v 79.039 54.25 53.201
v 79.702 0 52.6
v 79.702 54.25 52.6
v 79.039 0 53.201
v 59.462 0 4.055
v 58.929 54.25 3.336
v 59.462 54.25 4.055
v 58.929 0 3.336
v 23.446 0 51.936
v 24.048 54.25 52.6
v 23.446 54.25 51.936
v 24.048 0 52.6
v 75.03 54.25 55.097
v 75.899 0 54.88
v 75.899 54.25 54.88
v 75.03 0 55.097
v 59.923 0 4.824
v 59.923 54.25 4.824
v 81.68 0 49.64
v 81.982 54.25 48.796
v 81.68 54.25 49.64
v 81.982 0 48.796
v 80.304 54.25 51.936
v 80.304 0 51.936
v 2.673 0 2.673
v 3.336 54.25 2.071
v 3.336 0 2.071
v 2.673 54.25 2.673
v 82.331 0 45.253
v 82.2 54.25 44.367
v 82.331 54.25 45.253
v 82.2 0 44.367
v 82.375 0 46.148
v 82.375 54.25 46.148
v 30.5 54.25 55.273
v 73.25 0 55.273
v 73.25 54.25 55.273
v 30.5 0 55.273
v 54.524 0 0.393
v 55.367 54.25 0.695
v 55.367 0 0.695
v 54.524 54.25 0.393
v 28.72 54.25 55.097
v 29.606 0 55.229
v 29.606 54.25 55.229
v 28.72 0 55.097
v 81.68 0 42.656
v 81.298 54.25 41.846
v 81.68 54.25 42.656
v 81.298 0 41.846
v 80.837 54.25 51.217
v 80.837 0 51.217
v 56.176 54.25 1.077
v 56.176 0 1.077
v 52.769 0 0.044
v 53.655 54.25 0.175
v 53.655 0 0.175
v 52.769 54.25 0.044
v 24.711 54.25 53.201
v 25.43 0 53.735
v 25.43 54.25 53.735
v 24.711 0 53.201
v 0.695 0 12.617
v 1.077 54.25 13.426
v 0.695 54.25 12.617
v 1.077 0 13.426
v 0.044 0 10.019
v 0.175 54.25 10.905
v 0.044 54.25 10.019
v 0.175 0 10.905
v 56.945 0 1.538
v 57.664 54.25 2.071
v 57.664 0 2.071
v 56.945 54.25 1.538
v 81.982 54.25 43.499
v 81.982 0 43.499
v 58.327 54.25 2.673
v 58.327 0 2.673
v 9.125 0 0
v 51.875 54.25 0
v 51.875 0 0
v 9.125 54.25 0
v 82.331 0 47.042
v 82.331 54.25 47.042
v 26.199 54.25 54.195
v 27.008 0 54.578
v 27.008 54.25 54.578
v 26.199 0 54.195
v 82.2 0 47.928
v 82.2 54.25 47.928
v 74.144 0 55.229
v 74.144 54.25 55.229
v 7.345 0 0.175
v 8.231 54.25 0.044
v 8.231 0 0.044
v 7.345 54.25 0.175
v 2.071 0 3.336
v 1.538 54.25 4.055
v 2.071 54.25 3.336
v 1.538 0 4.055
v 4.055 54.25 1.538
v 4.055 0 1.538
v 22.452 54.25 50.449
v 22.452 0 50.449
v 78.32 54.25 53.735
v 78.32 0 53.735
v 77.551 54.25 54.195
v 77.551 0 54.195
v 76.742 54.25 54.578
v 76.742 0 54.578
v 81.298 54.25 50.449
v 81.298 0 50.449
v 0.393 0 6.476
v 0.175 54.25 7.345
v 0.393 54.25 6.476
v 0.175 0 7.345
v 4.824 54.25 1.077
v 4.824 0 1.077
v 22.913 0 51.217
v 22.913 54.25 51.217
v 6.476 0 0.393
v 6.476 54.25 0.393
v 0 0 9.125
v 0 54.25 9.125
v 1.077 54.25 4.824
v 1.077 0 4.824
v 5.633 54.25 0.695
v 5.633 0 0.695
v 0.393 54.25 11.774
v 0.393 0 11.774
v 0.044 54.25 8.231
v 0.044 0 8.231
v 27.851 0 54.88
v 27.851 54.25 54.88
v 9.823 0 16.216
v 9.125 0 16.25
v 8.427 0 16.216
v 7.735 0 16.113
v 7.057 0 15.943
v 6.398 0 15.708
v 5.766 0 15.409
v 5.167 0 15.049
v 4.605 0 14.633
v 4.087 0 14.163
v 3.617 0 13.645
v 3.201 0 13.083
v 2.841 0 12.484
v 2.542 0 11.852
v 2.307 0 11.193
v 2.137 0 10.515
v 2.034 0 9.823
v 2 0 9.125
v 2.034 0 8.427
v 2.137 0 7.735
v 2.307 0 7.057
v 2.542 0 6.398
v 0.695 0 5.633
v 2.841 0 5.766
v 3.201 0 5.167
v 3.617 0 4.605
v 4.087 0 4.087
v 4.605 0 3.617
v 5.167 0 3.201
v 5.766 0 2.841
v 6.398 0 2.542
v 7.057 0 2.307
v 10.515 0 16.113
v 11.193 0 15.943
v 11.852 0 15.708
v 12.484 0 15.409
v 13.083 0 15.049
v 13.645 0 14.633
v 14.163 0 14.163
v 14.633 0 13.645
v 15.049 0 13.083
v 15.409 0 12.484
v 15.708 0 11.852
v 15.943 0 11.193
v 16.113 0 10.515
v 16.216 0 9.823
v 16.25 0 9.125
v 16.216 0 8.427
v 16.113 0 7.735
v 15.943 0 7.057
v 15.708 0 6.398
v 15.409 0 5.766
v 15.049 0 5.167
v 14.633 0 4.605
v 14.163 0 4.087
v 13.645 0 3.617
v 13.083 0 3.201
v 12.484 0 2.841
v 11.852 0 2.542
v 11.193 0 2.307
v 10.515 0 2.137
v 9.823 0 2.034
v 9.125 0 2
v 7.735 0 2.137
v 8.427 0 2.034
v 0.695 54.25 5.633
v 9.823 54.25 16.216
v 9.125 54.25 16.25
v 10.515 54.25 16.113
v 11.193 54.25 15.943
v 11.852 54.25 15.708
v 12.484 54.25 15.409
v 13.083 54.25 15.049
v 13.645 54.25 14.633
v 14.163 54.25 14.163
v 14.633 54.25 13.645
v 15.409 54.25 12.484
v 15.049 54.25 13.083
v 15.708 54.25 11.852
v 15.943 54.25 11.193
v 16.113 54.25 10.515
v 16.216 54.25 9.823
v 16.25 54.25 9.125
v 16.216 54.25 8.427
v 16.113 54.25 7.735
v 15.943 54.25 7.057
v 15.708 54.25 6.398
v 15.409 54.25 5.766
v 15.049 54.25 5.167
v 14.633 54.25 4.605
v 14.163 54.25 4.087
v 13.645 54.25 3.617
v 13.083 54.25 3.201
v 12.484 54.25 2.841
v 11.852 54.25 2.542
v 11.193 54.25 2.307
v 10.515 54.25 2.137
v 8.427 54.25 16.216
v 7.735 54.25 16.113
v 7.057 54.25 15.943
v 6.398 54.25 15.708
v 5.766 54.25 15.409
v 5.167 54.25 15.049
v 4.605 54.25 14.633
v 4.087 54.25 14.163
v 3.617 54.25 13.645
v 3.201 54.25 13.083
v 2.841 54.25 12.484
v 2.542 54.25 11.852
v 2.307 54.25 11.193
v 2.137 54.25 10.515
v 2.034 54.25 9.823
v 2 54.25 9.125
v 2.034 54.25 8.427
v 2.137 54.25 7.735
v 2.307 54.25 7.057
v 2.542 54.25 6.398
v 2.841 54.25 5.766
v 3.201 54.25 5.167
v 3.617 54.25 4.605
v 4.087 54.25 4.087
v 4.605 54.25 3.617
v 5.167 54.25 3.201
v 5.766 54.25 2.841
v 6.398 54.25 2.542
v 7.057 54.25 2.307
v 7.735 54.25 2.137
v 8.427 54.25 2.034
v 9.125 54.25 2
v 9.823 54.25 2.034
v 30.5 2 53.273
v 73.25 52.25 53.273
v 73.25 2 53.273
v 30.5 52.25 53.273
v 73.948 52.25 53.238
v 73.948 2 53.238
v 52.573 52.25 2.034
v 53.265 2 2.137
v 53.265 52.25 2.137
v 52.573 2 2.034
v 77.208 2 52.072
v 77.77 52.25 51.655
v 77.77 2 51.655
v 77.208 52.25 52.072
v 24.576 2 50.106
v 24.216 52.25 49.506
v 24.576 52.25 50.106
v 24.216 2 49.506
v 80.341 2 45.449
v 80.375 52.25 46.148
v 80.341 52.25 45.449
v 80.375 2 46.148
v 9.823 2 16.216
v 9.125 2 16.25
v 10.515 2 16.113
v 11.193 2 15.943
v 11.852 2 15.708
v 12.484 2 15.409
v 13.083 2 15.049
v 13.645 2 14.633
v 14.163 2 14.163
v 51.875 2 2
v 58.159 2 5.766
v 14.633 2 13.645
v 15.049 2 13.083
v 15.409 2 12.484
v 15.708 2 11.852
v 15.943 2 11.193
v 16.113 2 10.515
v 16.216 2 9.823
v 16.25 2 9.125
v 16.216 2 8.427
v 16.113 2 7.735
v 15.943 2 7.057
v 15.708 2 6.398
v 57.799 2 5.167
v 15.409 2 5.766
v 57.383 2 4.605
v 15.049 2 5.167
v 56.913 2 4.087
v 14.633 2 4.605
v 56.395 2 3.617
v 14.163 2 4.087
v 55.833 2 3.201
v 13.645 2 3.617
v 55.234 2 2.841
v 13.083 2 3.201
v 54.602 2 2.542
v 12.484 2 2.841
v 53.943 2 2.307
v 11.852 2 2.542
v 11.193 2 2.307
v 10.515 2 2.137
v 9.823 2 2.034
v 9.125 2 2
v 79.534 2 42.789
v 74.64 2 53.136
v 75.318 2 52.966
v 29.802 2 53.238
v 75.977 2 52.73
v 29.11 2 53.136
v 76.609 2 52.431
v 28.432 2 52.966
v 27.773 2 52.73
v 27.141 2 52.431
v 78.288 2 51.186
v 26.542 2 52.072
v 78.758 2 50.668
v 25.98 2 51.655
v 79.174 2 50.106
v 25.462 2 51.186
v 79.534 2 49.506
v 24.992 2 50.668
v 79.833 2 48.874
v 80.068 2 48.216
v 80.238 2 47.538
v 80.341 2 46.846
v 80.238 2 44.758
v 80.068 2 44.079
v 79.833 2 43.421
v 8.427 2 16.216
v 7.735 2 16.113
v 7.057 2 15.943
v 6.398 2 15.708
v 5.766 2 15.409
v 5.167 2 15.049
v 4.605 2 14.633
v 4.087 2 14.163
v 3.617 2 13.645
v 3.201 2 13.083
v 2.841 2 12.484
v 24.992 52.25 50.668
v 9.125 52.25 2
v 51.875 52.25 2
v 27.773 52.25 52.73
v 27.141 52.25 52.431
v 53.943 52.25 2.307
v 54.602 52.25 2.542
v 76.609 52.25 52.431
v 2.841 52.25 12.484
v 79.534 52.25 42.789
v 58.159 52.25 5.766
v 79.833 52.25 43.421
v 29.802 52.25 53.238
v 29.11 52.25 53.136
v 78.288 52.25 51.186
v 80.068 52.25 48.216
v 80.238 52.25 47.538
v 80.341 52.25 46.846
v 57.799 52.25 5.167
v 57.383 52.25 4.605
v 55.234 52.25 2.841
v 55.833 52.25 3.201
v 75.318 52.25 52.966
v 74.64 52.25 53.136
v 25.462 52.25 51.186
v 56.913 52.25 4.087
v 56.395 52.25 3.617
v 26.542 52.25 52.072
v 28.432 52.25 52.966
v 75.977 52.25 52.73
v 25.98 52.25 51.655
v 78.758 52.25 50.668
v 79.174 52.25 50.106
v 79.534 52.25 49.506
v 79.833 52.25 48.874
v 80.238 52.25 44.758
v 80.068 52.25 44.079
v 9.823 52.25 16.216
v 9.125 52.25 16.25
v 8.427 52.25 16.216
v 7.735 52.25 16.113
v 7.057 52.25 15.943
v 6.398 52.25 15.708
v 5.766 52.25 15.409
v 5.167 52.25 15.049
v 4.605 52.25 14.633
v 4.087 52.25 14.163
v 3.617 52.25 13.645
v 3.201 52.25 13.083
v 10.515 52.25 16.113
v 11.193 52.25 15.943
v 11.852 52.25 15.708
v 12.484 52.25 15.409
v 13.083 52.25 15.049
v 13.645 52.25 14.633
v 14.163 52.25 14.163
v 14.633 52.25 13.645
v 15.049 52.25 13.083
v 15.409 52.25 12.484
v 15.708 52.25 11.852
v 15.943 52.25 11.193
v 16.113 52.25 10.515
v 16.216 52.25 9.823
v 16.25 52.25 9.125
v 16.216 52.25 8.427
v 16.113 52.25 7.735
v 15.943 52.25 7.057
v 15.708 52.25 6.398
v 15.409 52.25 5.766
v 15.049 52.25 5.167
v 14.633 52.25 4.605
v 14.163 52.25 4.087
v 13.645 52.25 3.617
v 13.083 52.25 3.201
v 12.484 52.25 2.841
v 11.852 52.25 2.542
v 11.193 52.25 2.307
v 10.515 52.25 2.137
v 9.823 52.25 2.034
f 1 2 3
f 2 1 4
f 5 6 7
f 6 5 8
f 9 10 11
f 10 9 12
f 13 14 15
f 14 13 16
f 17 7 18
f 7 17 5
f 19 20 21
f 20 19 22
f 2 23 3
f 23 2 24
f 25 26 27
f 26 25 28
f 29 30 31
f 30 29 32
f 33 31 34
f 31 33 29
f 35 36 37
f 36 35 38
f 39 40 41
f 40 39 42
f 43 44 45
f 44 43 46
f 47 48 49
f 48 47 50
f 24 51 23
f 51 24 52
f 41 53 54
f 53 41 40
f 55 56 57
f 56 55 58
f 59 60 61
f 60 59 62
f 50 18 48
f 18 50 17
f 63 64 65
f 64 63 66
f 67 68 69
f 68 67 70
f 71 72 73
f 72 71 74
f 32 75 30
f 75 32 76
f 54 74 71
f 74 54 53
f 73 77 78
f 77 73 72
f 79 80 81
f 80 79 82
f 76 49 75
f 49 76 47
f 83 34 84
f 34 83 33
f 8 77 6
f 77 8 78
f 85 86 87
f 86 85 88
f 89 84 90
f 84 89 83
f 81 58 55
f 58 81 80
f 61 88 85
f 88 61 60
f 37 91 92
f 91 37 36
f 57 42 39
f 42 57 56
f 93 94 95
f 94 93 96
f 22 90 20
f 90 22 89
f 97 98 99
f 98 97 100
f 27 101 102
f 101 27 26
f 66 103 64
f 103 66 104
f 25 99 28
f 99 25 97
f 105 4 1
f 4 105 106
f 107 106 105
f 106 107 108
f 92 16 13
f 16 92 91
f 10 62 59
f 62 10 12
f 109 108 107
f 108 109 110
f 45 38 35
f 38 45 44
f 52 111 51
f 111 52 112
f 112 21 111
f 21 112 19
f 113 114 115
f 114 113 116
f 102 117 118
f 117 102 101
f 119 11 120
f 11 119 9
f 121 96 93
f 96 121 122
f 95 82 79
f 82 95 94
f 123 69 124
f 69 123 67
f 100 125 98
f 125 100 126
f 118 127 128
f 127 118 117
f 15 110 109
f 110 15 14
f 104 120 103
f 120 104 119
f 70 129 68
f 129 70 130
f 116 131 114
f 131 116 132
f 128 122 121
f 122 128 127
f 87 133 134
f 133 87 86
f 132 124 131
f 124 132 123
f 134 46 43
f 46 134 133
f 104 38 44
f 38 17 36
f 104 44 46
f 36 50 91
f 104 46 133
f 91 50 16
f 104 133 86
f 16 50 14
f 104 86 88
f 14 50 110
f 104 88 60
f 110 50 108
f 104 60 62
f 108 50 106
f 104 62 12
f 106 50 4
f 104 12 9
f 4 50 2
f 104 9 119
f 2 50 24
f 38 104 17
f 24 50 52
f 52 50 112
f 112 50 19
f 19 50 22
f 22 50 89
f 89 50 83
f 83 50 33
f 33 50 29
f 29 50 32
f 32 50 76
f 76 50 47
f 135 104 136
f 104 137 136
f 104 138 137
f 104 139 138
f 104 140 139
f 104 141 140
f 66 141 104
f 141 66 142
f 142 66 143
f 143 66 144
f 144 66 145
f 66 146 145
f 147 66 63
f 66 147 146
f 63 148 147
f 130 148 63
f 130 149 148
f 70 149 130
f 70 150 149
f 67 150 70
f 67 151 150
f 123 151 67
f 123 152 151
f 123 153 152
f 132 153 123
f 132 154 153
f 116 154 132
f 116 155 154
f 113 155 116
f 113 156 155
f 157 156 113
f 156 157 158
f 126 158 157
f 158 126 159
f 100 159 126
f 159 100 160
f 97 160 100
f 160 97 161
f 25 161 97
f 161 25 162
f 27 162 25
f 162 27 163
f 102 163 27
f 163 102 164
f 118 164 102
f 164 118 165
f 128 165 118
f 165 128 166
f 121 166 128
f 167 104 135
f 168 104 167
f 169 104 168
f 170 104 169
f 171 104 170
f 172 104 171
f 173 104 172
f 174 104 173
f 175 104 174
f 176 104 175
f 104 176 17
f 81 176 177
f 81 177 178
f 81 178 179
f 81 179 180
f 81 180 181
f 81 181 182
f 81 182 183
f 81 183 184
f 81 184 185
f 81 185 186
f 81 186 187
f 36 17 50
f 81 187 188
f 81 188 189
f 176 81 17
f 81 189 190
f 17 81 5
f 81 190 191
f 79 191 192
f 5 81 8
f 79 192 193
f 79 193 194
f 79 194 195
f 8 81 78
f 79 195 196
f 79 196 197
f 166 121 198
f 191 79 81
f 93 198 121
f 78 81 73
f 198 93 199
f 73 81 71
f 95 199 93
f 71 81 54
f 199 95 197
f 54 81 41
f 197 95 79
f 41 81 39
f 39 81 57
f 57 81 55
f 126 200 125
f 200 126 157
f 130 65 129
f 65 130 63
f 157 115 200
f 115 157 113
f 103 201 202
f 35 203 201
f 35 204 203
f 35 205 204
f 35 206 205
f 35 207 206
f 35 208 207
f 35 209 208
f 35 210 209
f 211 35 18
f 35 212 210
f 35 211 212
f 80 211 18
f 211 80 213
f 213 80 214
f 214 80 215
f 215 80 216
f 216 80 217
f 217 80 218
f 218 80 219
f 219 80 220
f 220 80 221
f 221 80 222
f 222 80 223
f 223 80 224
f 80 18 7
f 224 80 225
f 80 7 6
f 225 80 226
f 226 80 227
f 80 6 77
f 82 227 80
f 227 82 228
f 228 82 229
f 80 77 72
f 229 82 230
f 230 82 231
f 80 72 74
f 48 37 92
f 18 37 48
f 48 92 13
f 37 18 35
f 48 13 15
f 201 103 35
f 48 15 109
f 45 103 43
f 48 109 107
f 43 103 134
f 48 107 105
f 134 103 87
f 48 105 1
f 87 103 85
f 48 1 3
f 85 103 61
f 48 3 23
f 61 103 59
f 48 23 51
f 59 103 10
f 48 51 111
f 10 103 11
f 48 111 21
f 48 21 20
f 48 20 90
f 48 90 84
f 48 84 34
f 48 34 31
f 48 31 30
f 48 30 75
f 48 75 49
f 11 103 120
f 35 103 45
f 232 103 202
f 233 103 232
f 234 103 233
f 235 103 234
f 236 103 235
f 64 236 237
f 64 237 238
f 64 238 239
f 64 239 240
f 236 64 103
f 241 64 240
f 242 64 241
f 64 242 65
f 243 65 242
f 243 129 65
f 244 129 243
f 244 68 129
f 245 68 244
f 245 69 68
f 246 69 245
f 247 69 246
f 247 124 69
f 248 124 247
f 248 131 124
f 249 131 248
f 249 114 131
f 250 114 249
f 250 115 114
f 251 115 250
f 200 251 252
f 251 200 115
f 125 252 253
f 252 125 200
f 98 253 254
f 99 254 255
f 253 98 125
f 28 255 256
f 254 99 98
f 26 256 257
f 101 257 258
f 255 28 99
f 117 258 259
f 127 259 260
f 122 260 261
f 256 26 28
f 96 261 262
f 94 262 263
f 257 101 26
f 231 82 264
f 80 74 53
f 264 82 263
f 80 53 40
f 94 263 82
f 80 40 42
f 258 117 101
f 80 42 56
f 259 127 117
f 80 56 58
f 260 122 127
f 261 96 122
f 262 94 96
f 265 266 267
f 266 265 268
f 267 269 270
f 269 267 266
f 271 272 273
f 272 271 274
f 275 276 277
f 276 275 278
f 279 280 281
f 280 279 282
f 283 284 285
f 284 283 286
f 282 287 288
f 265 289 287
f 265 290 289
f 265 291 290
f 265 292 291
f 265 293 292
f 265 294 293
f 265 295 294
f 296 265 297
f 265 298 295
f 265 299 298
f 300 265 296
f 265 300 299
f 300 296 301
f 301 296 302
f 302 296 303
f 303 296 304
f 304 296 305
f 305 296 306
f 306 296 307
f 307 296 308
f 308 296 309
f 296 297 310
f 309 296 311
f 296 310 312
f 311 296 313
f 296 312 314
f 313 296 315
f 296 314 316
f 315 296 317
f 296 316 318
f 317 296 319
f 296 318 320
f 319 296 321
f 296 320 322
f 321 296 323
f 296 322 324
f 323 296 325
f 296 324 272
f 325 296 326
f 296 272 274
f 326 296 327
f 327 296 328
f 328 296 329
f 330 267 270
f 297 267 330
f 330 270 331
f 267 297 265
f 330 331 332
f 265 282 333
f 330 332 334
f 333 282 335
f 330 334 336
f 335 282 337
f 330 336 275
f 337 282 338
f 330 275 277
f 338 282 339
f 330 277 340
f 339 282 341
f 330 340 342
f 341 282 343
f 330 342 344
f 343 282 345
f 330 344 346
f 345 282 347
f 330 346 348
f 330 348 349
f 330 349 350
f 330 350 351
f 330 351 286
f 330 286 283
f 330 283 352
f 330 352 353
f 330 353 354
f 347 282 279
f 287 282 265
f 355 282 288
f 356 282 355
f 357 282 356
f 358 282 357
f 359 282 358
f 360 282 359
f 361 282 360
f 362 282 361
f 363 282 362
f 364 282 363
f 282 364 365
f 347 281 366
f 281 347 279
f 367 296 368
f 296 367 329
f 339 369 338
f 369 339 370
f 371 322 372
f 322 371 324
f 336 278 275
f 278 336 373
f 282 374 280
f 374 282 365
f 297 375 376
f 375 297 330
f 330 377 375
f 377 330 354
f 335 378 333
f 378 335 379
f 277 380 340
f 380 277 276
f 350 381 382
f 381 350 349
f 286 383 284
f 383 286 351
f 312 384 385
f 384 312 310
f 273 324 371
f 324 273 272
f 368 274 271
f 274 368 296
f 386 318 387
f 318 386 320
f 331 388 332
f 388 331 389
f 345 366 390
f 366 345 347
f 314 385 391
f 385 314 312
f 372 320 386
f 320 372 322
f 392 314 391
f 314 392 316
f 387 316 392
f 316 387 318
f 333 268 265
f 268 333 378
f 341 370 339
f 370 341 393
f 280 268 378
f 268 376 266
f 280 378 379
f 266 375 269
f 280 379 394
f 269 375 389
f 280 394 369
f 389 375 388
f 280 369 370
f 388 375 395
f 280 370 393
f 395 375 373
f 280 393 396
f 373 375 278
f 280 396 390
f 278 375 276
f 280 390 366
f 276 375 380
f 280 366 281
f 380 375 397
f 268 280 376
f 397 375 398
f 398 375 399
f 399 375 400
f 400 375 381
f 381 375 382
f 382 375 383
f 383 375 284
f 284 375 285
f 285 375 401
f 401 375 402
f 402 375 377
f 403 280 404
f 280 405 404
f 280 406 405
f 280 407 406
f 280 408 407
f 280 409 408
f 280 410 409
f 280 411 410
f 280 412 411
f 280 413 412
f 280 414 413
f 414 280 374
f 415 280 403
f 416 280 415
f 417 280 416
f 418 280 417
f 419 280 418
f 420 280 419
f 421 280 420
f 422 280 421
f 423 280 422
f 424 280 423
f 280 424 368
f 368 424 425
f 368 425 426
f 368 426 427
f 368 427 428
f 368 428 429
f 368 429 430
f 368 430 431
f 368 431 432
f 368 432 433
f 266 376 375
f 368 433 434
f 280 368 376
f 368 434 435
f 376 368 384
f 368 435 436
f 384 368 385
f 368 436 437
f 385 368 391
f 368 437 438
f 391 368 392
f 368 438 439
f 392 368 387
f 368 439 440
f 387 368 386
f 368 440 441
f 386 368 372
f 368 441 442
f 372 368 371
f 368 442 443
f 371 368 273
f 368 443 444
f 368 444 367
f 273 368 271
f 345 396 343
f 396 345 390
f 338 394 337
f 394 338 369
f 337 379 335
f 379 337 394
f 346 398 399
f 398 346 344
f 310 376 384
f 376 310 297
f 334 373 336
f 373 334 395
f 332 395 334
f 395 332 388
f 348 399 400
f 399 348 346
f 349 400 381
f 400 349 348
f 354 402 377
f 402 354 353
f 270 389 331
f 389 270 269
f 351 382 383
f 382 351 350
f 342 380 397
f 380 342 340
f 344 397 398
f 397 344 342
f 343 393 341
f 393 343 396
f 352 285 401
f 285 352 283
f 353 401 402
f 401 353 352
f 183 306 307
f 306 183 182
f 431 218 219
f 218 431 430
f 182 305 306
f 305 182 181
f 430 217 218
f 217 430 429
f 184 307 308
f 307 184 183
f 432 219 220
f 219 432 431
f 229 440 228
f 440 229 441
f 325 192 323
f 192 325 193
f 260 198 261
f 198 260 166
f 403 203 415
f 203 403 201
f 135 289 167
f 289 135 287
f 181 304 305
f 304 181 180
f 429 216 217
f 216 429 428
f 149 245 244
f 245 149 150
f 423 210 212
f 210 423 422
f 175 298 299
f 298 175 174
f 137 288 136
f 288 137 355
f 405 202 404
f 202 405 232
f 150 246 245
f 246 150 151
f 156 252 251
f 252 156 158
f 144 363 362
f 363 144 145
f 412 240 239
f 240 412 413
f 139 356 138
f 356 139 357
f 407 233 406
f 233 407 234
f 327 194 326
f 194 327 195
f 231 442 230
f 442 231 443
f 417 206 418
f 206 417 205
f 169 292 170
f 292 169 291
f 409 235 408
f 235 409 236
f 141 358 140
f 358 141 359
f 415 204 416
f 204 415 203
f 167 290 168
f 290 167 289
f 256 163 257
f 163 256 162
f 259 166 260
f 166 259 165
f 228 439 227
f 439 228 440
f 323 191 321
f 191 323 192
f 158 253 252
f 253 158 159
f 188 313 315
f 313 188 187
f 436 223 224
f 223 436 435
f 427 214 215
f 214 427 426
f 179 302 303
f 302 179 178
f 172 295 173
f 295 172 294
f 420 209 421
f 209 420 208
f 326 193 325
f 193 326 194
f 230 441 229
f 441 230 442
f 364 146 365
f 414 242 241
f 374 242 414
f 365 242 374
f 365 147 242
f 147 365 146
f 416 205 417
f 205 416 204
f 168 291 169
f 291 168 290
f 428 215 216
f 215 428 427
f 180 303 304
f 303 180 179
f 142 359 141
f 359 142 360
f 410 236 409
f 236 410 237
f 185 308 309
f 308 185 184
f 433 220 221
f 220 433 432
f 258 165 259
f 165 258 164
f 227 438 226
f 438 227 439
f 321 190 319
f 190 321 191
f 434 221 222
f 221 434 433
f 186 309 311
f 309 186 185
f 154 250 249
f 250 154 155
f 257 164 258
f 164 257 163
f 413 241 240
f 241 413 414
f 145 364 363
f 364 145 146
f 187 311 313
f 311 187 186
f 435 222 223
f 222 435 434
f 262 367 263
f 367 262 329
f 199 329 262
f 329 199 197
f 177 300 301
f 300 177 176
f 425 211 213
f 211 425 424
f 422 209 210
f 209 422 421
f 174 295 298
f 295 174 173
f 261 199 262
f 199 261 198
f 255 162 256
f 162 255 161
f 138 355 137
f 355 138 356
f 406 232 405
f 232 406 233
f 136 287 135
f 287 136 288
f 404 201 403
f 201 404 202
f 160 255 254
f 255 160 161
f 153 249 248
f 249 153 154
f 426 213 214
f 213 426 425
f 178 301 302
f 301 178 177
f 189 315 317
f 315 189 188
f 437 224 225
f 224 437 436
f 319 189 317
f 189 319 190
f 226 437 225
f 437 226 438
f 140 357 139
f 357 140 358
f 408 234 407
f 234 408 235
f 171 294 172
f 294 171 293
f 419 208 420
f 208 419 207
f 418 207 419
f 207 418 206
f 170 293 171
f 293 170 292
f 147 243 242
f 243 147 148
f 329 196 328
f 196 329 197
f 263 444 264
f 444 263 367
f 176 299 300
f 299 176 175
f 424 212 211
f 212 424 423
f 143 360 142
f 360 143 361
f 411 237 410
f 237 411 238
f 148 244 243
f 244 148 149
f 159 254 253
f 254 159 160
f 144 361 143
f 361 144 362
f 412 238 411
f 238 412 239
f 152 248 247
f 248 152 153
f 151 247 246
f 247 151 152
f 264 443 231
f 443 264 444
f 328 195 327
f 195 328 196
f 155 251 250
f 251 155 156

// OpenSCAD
aa_d = 14.25;
aa_h = 50.25;
aaa_d = 10.25;
aaa_h = 44;


module battery(d, h) {
  rotate([-90, 0, 0]) cylinder(h=h, d=d, $fn=64);
}


module batteries(d, h, rows, cols, padding) {
  _h = h / 2 + padding;
  translate([d / 2 + padding, _h, d / 2 + padding])
    minkowski() {
      battery(d + 2 * padding, _h);
      rotate([90, 0, 0])
        linear_extrude(_h)
          polygon([
            [                 0               ,                        0],
            [         (rows - 1) * d * sin(30), (cols - 1) * d * cos(30)],
            [(rows - 1) * (d + d * sin(30))   , (cols - 1) * d * cos(30)],
            [(rows - 1) * d                   ,                        0]
          ]);
    }
}


difference() {
  batteries(aa_d, aa_h, 4, 4, 2);
  translate([2, 2, 2])
    batteries(aa_d, aa_h, 4, 4, 0);
  translate([aa_d / 2 + 2, 0, aa_d / 2 + 2])
    battery(aa_d, aa_h + 4);
}
